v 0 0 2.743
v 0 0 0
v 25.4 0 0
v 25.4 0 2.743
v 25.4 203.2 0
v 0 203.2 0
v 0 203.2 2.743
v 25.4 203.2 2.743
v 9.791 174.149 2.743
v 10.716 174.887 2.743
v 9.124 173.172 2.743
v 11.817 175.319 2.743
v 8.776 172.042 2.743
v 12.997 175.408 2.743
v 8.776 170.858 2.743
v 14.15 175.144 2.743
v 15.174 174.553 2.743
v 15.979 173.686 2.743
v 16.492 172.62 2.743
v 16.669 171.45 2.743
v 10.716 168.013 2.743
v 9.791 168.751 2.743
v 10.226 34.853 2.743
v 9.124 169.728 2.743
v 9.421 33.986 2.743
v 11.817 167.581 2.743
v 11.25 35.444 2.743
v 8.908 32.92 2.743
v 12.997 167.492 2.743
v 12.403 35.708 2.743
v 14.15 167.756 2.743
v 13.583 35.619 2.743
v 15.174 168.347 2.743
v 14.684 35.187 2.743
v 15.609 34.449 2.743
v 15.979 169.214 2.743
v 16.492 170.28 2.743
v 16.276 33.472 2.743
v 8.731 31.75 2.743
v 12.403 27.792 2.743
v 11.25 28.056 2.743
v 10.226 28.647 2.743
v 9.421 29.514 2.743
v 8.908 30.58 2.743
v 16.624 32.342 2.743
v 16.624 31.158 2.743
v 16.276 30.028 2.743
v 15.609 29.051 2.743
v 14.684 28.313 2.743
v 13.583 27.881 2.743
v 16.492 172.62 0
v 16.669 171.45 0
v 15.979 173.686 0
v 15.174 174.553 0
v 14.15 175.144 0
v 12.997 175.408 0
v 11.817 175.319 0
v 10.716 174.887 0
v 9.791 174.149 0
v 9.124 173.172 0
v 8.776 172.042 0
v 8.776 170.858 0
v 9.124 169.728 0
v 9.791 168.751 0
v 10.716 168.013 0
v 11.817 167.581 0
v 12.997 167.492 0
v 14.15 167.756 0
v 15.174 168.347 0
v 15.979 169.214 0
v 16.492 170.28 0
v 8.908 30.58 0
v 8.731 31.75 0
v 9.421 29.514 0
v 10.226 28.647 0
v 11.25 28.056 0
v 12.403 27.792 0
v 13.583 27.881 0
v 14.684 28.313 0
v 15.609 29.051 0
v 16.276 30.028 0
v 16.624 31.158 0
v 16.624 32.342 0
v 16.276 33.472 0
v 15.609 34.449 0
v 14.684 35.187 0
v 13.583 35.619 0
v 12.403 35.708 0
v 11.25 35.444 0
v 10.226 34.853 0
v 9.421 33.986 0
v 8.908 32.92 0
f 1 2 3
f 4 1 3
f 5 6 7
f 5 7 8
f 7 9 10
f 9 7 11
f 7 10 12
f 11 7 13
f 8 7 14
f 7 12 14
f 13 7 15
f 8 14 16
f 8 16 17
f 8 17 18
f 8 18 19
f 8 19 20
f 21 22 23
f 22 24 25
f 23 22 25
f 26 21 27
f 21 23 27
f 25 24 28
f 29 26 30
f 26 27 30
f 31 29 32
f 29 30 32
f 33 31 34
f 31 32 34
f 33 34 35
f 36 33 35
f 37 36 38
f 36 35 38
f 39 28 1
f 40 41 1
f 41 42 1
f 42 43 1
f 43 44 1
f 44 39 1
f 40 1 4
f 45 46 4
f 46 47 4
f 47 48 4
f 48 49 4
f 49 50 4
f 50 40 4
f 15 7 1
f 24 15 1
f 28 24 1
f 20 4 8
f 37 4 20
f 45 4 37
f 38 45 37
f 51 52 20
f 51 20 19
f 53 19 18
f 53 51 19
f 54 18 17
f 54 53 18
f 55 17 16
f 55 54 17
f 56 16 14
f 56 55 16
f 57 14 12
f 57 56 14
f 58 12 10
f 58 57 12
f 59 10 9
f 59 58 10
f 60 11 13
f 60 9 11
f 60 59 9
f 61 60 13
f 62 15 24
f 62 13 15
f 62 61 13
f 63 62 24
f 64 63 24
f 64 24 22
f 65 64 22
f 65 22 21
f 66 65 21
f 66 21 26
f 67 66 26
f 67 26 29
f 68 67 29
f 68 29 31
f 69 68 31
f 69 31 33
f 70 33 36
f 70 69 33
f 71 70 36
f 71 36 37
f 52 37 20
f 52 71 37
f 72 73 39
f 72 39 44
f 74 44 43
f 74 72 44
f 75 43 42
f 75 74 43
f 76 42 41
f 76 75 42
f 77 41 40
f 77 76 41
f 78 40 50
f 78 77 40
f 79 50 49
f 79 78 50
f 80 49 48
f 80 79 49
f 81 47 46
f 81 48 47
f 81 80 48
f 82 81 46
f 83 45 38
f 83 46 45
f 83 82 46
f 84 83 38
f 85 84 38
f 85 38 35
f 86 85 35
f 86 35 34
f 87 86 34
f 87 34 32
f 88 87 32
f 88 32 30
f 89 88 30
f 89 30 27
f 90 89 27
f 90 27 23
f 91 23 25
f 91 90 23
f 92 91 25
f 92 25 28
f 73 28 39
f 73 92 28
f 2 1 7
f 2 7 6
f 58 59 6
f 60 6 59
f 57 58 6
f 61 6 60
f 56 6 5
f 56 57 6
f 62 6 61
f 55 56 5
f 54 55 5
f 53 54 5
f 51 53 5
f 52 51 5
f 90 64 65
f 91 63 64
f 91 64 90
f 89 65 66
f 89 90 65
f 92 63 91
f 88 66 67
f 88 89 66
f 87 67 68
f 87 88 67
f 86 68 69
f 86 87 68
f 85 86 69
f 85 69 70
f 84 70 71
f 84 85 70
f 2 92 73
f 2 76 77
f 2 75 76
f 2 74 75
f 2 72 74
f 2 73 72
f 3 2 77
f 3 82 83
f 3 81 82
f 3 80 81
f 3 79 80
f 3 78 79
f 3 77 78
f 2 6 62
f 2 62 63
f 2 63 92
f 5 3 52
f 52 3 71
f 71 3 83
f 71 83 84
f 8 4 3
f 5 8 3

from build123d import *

# Parameters (mm, degrees)
SKETCH1_W               = 25.4
SKETCH1_H               = 2.7432
BOSS_EXTRUDE1_DEPTH     = 203.2
CUT_EXTRUDE1_DEPTH      = 109.054860552
CUT_EXTRUDE1_DEPTH_BACK = 109.054860552
SKETCH2_R               = 3.96875


with BuildPart() as part:
    # Sketch1 → Boss-Extrude1 (new body)
    with BuildSketch(Plane(origin=(0, 0, 0), x_dir=(1, 0, 0), z_dir=(0, 1, 0))):
        with Locations((12.7, -1.3716)):
            Rectangle(SKETCH1_W, SKETCH1_H)
    extrude(amount=BOSS_EXTRUDE1_DEPTH)

    # Sketch2 → Cut-Extrude1 (cut, two sides: drawn at the far end of the back side and taken through both)
    with BuildSketch(Plane(origin=(8.791703067, 106.606717755, 5.9182), x_dir=(1, 0, 0), z_dir=(0, 0, 1)).offset(-CUT_EXTRUDE1_DEPTH_BACK)):
        with Locations((3.908296933, 64.843282245)):
            Circle(SKETCH2_R)
        with Locations(Location((3.908296933, -74.856717755, 0), (0, 0, 180))):
            Circle(SKETCH2_R)
    extrude(amount=CUT_EXTRUDE1_DEPTH + CUT_EXTRUDE1_DEPTH_BACK, mode=Mode.SUBTRACT)


solid = part.part
